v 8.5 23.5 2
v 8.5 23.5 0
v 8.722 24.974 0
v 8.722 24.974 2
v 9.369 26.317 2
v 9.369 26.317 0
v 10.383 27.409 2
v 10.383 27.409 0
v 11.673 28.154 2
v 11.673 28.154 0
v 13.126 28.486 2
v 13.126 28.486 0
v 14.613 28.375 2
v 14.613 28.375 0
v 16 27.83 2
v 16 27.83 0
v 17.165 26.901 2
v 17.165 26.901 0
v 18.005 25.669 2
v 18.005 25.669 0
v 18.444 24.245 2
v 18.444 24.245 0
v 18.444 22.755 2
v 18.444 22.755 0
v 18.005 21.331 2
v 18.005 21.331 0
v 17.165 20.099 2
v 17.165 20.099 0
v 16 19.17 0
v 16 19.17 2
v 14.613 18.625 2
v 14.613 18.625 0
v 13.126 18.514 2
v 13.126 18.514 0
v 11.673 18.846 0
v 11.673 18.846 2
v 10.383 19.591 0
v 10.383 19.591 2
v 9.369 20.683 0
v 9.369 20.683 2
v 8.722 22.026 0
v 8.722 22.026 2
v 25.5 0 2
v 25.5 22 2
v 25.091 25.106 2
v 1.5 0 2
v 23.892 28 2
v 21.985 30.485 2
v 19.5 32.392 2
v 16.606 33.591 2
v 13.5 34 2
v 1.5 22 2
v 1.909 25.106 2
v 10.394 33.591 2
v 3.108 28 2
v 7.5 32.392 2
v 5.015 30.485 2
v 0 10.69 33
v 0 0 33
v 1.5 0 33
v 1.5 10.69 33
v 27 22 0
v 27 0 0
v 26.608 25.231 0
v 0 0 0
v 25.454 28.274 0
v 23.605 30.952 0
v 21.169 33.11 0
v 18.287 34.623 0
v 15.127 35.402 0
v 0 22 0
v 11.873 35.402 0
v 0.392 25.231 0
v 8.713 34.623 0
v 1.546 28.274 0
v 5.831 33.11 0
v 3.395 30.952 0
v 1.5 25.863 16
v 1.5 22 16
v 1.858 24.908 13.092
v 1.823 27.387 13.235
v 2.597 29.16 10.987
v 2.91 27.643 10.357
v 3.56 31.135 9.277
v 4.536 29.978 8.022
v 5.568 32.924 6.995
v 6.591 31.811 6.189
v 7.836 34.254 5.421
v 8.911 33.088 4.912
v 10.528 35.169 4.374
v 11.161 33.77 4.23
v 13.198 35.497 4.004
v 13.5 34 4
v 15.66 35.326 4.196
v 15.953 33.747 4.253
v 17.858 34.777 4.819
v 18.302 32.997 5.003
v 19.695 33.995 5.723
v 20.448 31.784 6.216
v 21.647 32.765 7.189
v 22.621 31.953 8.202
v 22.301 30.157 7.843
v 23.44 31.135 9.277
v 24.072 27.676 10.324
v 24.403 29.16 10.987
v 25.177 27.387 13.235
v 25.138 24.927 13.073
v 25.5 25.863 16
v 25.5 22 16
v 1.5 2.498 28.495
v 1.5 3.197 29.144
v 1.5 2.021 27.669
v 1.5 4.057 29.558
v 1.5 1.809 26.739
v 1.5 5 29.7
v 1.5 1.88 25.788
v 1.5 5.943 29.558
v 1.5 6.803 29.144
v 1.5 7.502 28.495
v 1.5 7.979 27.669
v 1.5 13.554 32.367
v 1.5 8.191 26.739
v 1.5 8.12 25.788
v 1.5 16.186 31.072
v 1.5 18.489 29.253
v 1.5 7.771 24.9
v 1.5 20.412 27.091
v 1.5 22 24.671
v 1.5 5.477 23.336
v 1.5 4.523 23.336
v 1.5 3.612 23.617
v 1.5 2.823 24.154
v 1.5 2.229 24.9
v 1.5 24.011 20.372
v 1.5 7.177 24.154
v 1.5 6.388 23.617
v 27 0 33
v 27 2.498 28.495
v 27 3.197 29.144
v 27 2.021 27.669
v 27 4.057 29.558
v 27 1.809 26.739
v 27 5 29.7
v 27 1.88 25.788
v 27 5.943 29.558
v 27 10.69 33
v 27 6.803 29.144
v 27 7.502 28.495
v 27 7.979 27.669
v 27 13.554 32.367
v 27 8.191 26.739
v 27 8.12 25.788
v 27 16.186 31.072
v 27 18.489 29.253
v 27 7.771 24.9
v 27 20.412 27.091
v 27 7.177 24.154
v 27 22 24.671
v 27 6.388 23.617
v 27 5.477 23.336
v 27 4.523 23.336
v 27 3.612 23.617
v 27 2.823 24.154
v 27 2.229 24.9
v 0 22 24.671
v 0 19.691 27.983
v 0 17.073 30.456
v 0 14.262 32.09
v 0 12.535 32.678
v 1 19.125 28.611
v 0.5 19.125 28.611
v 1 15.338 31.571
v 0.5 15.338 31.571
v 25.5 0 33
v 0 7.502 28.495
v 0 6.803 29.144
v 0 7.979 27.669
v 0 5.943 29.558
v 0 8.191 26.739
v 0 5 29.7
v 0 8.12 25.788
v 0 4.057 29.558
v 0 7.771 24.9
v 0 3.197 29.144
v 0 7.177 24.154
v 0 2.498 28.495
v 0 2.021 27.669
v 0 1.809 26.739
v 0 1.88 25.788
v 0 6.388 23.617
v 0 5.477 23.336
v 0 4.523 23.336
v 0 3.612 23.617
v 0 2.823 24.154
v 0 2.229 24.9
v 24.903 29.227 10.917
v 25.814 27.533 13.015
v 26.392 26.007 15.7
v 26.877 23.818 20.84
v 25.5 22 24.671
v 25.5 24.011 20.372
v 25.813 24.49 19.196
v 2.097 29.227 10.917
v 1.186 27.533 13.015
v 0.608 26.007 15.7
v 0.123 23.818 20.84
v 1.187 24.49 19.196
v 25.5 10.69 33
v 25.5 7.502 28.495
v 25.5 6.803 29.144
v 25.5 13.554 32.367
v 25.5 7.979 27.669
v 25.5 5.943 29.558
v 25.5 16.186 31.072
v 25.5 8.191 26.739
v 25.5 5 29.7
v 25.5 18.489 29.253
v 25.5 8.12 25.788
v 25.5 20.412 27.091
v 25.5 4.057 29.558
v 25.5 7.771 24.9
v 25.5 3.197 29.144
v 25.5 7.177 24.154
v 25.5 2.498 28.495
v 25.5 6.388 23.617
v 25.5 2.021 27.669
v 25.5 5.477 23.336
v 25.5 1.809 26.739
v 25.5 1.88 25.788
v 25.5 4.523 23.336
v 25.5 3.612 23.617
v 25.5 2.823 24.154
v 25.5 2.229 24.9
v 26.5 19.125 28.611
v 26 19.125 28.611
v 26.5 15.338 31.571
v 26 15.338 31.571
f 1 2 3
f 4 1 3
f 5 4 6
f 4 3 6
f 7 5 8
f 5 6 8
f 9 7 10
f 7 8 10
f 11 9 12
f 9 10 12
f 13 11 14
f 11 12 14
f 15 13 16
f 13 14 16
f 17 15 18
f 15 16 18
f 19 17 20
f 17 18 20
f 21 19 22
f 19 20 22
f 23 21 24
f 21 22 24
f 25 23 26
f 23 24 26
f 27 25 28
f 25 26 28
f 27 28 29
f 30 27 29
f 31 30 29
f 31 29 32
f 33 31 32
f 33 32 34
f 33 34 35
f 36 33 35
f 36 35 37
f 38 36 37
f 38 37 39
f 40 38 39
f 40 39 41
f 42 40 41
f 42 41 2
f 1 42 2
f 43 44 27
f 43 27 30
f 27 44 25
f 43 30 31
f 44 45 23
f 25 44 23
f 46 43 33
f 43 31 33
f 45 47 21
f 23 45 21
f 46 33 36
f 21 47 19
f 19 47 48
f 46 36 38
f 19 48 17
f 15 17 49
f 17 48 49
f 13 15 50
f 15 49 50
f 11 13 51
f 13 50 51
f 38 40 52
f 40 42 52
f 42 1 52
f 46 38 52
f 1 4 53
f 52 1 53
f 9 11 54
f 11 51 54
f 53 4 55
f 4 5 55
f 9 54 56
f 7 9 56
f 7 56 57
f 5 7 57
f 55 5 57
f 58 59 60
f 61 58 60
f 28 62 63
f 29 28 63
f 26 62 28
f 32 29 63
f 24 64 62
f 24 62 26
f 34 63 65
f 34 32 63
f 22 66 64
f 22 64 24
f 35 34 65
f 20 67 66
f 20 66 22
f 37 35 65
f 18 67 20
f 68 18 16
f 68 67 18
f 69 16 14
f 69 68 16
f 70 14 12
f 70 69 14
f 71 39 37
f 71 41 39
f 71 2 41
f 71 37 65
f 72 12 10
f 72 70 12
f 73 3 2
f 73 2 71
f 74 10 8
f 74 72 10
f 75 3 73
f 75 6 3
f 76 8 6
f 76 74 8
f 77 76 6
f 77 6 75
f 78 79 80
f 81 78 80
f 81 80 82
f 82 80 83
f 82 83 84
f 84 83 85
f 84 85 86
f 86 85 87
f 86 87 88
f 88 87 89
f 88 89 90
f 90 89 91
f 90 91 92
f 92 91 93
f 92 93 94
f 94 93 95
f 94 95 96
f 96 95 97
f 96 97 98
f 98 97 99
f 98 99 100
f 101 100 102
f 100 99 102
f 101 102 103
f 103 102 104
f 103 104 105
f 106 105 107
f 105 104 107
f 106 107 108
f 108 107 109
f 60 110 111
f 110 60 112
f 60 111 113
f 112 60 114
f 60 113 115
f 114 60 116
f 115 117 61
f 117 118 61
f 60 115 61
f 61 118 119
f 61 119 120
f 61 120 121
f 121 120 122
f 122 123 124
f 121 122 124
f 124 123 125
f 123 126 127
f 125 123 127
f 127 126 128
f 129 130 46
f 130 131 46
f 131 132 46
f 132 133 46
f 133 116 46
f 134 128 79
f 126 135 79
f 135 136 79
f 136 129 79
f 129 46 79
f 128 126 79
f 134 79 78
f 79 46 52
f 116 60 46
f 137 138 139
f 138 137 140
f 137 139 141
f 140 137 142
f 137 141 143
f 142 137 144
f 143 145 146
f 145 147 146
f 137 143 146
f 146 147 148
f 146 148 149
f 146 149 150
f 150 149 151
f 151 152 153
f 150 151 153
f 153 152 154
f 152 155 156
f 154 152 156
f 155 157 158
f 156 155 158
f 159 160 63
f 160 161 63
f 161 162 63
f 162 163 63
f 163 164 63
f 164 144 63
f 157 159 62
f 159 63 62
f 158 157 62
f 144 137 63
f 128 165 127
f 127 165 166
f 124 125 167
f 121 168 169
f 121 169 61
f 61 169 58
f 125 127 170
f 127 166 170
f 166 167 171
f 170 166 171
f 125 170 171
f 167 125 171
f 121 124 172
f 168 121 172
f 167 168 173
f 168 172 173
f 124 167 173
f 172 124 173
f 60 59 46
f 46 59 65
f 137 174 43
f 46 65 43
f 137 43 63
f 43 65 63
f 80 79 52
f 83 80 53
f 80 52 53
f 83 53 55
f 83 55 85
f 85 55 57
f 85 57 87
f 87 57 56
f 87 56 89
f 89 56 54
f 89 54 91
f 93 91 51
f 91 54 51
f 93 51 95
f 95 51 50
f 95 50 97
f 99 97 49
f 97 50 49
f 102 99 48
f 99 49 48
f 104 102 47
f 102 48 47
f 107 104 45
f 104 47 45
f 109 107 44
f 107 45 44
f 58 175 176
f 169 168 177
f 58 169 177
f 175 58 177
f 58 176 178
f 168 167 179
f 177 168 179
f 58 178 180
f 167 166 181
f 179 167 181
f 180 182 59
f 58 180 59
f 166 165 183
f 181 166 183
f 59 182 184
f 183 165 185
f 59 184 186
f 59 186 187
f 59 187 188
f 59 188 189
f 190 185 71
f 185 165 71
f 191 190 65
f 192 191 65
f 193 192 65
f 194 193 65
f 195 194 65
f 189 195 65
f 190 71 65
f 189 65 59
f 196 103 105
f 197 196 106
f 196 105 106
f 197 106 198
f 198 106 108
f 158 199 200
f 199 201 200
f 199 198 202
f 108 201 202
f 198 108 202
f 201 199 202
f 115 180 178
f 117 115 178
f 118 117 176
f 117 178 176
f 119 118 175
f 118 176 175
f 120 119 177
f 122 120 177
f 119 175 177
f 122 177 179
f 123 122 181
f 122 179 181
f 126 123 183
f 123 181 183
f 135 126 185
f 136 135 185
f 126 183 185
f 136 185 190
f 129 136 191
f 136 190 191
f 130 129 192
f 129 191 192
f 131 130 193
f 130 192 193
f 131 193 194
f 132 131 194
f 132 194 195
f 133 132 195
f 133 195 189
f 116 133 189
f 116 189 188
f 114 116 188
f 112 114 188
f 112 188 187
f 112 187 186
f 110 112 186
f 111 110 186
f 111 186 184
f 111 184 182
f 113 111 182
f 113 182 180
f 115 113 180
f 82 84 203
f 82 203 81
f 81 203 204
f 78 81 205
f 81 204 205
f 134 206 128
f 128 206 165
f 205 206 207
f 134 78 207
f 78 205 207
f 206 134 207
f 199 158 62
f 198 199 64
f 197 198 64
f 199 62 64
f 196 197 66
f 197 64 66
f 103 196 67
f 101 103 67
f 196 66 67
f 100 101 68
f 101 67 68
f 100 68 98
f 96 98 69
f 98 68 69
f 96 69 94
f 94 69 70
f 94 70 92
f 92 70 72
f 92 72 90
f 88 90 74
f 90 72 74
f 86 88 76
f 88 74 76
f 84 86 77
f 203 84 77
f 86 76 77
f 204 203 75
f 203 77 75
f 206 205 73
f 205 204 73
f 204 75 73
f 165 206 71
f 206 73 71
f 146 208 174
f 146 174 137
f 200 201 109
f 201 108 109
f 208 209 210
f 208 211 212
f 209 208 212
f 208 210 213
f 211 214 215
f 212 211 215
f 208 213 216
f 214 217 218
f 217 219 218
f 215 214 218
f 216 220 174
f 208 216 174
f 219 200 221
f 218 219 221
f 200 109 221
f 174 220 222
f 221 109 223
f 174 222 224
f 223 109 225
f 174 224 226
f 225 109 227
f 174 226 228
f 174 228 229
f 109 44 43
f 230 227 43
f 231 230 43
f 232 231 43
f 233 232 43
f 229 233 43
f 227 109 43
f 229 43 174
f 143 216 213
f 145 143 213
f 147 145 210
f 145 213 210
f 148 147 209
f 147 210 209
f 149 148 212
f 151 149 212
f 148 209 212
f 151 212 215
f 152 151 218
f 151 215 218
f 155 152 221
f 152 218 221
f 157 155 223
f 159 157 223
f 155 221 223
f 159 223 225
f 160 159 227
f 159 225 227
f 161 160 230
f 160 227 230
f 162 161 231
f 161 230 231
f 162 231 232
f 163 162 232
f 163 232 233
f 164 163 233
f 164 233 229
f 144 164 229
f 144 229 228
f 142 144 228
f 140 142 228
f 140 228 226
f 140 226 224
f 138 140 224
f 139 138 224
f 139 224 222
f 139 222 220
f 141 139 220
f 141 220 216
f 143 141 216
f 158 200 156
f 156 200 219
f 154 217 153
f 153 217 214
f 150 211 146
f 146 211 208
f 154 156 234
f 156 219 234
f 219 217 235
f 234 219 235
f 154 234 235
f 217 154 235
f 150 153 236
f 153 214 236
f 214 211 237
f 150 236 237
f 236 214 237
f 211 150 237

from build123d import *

# Parameters (mm, degrees)
BOSS_EXTRUDE1_DEPTH = 2
BOSS_EXTRUDE2_DEPTH = 31
CUT_EXTRUDE1_DEPTH  = 56.481979056
CUT_EXTRUDE2_DEPTH  = 56.481979228
SKETCH5_R           = 3.2
CUT_EXTRUDE3_DEPTH  = 56.481979228
SKETCH6_R           = 5
CUT_EXTRUDE4_DEPTH  = 56.481979228


with BuildPart() as part:
    # Sketch1 → Boss-Extrude1 (new body)
    with BuildSketch(Plane.XY):
        with BuildLine():
            Line((0, 0), (0, 22))
            ThreePointArc((0, 22), (13.5, 35.5), (27, 22))
            Line((27, 22), (27, 0))
            Line((27, 0), (0, 0))
        make_face()
    extrude(amount=BOSS_EXTRUDE1_DEPTH)

    # Sketch2 → Boss-Extrude2 (add)
    with BuildSketch(Plane.XY.offset(2)):
        with BuildLine():
            Line((27, 0), (27, 22))
            ThreePointArc((27, 22), (13.5, 35.5), (0, 22))
            Line((0, 22), (0, 0))
            Line((0, 0), (1.5, 0))
            Line((1.5, 0), (1.5, 1.5))
            Line((1.5, 1.5), (1.5, 22))
            ThreePointArc((1.5, 22), (13.5, 34), (25.5, 22))
            Line((25.5, 22), (25.5, 1.5))
            Line((25.5, 1.5), (25.5, 0))
            Line((25.5, 0), (27, 0))
        make_face()
    extrude(amount=BOSS_EXTRUDE2_DEPTH)

    # Sketch3 → Cut-Extrude1 (cut, through all)
    with BuildSketch(Plane(origin=(0, 0, 0), x_dir=(1, 0, 0), z_dir=(0, 1, 0))):
        with BuildLine():
            Line((1.5, -33), (1.5, -16))
            ThreePointArc((1.5, -16), (13.5, -4), (25.5, -16))
            Line((25.5, -16), (25.5, -33))
            Line((25.5, -33), (1.5, -33))
        make_face()
    extrude(amount=CUT_EXTRUDE1_DEPTH, mode=Mode.SUBTRACT)

    # Sketch4 → Cut-Extrude2 (cut, through all)
    with BuildSketch(Plane.ZY):
        with BuildLine():
            Line((33, 31.363603565), (9.117273512, 31.363603565))
            add(Edge.make_bspline(
                [(9.117273512, 31.363603565), (12.96325336, 25.746828887), (19.327266499, 25.020144715), (24.670979231, 22)],
                knots=[0, 0, 0, 0, 0.522970266, 0.522970266, 0.522970266, 0.522970266], degree=3))
            Line((24.670979231, 22), (33, 22))
            Line((33, 22), (33, 31.363603565))
        make_face()
        with BuildLine():
            Line((33, 22), (24.670979231, 22))
            add(Edge.make_bspline(
                [(24.670979231, 22), (28.91814661, 19.599597741), (32.520787743, 15.750410887), (33, 10.690145811)],
                knots=[0.522970266, 0.522970266, 0.522970266, 0.522970266, 0.938625516, 0.938625516, 0.938625516, 0.938625516], degree=3))
            Line((33, 10.690145811), (33, 22))
        make_face()
    extrude(amount=-CUT_EXTRUDE2_DEPTH, mode=Mode.SUBTRACT)

    # Sketch5 → Cut-Extrude3 (cut, through all)
    with BuildSketch(Plane.ZY):
        with Locations((26.5, 5)):
            Circle(SKETCH5_R)
    extrude(amount=-CUT_EXTRUDE3_DEPTH, mode=Mode.SUBTRACT)

    # Sketch6 → Cut-Extrude4 (cut, through all)
    with BuildSketch(Plane(origin=(0, 0, 0), x_dir=(-1, 0, 0), z_dir=(0, 0, -1))):
        with Locations((-13.5, 23.5)):
            Circle(SKETCH6_R)
    extrude(amount=-CUT_EXTRUDE4_DEPTH, mode=Mode.SUBTRACT)


solid = part.part
